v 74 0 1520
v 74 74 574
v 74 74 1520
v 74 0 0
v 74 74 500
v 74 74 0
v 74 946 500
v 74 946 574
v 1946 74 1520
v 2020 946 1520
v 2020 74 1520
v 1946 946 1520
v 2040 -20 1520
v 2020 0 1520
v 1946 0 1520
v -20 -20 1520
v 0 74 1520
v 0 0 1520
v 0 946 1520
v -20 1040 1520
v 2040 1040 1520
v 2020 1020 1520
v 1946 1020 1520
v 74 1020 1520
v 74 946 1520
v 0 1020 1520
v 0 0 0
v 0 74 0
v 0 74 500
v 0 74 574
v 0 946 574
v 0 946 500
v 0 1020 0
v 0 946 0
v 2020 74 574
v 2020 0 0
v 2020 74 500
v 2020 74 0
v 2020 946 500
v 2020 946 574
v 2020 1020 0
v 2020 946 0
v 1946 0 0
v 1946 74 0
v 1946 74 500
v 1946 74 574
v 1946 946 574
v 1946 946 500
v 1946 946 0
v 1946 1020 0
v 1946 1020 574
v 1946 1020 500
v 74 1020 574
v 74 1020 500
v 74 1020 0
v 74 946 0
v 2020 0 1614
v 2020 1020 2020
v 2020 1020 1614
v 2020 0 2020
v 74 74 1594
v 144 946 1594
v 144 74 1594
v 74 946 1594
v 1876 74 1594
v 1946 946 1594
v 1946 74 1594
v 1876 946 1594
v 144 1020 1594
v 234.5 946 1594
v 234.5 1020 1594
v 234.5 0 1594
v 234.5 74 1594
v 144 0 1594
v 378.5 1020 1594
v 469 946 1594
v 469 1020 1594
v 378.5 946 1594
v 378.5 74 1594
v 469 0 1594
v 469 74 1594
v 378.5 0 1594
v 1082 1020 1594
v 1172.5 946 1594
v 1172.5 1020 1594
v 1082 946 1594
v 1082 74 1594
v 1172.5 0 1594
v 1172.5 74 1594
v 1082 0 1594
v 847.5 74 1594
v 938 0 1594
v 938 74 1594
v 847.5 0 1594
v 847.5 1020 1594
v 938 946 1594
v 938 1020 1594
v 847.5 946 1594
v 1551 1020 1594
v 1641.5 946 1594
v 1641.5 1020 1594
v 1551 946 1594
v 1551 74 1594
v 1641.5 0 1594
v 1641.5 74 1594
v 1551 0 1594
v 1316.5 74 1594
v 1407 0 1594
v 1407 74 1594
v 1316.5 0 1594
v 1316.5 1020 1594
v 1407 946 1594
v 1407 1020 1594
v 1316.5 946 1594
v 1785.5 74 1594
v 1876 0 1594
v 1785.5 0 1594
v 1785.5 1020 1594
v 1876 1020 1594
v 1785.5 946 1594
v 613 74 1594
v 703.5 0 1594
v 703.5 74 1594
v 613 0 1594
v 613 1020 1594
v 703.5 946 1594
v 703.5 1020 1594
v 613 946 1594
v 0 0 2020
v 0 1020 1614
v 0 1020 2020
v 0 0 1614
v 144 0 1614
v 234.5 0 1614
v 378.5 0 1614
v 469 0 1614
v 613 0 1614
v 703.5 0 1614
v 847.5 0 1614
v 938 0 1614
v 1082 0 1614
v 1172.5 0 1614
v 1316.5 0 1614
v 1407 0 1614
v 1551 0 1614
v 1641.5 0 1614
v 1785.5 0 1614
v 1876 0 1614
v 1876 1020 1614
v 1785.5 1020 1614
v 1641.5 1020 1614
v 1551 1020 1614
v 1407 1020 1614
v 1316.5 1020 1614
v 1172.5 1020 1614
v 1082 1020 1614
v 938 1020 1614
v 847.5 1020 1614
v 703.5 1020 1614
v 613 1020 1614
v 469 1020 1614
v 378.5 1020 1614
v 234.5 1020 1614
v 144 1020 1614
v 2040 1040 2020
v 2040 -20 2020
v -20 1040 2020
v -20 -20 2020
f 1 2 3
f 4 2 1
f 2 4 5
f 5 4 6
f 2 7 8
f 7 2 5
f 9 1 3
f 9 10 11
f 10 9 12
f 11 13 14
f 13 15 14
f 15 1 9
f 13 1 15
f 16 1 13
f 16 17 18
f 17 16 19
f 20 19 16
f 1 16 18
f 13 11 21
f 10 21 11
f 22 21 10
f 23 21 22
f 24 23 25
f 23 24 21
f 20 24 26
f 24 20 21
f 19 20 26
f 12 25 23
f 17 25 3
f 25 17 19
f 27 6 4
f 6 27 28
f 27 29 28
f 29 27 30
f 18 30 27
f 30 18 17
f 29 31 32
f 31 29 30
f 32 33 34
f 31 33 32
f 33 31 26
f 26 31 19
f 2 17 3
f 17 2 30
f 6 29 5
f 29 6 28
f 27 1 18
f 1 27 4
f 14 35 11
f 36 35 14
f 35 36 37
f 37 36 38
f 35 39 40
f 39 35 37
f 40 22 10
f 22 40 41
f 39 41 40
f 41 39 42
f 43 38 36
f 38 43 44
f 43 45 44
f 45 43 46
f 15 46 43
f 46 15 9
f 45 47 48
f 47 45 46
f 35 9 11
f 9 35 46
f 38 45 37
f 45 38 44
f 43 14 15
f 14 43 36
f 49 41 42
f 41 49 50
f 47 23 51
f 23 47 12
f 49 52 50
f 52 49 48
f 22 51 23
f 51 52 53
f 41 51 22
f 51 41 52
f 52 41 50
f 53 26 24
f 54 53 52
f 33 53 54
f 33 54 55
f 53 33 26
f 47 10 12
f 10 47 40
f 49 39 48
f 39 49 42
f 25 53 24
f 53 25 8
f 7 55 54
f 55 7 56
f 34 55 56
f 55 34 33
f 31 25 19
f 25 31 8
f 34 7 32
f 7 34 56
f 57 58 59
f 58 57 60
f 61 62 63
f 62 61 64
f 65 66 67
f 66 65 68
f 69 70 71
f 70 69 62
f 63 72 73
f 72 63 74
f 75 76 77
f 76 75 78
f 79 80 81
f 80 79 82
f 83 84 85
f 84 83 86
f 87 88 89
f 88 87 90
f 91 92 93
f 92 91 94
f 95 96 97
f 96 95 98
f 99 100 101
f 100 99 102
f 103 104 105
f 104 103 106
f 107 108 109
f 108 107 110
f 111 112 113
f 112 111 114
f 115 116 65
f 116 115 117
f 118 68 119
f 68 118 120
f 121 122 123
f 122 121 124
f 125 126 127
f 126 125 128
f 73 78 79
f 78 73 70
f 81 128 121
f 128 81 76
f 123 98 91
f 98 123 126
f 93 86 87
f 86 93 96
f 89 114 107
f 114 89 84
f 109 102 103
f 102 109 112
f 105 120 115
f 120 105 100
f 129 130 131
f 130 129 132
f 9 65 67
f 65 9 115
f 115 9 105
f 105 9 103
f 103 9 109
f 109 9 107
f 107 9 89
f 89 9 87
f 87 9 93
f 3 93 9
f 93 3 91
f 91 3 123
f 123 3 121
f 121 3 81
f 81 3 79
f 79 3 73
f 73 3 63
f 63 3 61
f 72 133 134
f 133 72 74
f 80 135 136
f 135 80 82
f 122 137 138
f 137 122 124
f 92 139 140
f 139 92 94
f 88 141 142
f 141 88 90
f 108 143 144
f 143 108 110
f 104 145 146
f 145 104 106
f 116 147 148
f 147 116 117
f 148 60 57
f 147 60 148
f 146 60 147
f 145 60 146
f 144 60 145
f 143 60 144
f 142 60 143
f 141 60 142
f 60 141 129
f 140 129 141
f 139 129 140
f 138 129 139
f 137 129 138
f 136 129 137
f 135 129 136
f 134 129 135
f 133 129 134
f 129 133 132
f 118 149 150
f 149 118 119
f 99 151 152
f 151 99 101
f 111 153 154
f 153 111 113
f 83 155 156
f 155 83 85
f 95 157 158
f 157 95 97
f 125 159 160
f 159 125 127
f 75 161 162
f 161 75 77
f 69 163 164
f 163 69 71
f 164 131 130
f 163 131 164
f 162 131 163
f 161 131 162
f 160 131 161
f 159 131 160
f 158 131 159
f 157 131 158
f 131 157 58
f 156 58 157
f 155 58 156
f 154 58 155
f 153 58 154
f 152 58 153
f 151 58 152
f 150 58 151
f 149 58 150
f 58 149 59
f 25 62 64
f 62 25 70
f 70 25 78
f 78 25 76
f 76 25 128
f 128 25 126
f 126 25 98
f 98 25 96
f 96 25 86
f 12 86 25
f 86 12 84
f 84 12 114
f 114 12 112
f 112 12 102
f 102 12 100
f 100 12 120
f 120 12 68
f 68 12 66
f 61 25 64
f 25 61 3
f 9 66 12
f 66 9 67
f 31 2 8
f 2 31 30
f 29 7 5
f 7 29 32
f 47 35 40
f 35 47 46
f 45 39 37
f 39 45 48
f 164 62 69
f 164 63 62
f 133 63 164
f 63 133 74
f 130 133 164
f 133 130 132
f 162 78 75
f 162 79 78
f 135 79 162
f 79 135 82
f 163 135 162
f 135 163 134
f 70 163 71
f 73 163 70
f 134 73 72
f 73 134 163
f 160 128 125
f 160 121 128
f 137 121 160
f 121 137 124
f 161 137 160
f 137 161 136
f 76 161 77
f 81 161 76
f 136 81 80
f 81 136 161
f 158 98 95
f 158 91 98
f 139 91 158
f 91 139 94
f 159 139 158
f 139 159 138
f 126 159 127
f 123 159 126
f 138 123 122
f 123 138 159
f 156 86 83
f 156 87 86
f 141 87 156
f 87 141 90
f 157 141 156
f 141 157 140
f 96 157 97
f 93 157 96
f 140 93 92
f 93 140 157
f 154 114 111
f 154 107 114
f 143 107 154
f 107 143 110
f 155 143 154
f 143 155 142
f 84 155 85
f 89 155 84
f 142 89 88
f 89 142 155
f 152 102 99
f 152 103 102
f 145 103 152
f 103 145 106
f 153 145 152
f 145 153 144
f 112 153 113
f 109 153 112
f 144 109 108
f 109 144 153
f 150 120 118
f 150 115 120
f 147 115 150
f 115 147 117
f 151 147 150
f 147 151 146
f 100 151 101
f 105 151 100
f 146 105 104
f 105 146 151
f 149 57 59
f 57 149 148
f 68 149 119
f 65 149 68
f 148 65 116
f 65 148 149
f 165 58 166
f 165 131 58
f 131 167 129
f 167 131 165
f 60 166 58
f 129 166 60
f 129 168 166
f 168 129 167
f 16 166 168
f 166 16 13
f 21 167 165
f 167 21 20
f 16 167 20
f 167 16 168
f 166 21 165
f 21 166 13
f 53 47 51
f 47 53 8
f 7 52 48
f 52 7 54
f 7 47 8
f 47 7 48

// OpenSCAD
// bed module

bed_length              = 2020;
bed_width               = 1020;
bed_frame_height        = 30;

bed_leg_height          = 1520;
bed_leg_width           = 74;

bed_rim_height          = 500;
bed_rim_width           = 20;

bed_frame_bar_width     = 144;
bed_frame_bar_height    = 20;
bed_frame_bar_space     = 80;


// example render with above values
bed(bed_length,
    bed_width,
    bed_frame_height,
    bed_leg_height,
    bed_leg_width,
    bed_rim_height,
    bed_rim_width,
    bed_frame_bar_height,
    bed_frame_bar_width,
    bed_frame_bar_space
    );


module bed(length,
           width,
           frame_height,
           leg_height,
           leg_width,
           rim_height,
           rim_width,
           frame_bar_height,
           frame_bar_width,
           frame_bar_space){
               
    // calculate frame bar values
    frame_bar_length    = width;
    frame_bar_num       = floor((length - frame_bar_width)
                         /(frame_bar_width + frame_bar_space));
    
    frame_bar_space     = (((length - frame_bar_width)
                            %(frame_bar_width + frame_bar_space))
                           /frame_bar_num)
                          +frame_bar_space;
               
    // calculate leg values
    bed_leg_x   = bed_length - leg_width;
    bed_leg_y   = bed_width - leg_width;
    bed_leg_pos = [[0,0,0],
                   [bed_leg_x,0,0],
                   [bed_leg_x,bed_leg_y,0],
                   [0,bed_leg_y,0]];


    // legs
    color("red")
    for (i=bed_leg_pos){
        translate(i)
            cube([leg_width,leg_width,leg_height]);
    }

    
    // upper side cross bars
    for(i=[0,width-leg_width])
        translate([0,i,leg_height])
            cube([length,leg_width,leg_width]);

    // upper front/back crossbars
    for(i=[0,length-leg_width]){
        translate([i,leg_width,leg_height])
            cube([leg_width,width-2*leg_width,leg_width]);
    }
    
    // lower side crossbars
    translate([leg_width,width-leg_width,rim_height])
        cube([length-2*leg_width,leg_width,leg_width]);
    
    // lower front/back cross bars
    for(i=[0,length-leg_width]){
        translate([i,leg_width,rim_height])
            cube([leg_width,width-2*leg_width,leg_width]);
    }    



    // bed frame bars
    translate([0,0,leg_height+leg_width]) {
    
        // first frame bar
        cube([frame_bar_width, frame_bar_length, frame_bar_height]);
        
        
        // remaining frame bars
        for(i=[0:1:frame_bar_num]){
            translate([i*(frame_bar_width+frame_bar_space),0,0])
                cube([frame_bar_width, frame_bar_length, frame_bar_height]);
        }
    }
    
    /*color("blue")
    translate([0,0,bed_leg_height])
        cube([length,width,frame_height]);
    */ 
    // side rims
    #for(i=[-rim_width, width])
        translate([0,i,leg_height])
            cube([length,rim_width,rim_height]);
    
    // front/back rims
    #for(i=[-rim_width, length])
        translate([i,-rim_width,leg_height])
            cube([rim_width,width + 2*rim_width,rim_height]);
    
    // output materials
    echo("Legs:\t\t 4x: ", h=leg_width, w=leg_width, l=leg_height);
    echo("Upper crossbars side:\t 2x: ", h=leg_width, w=leg_width, l=length);
    echo("Lower crossbars side:\t 1x: ", h=leg_width, w=leg_width, l=length-2*leg_width);
    echo("Crossbars f/b:\t 4x: ", h=leg_width, w=leg_width, h=width-2*leg_width);
    echo();
    echo("Total length\t ", 4*leg_height
                          + 2*length
                          + length-2*leg_width
                          + 4*(width-2*leg_width));
    echo("Rims side\t 2x: ", h=rim_width, w=rim_height, l=length);
    echo("Rims front/back\t 2x: ", h=rim_width, w=rim_height, l=width + 2*rim_width);
    echo("Frame bars\t ", num=frame_bar_num + 1, h=frame_bar_height, w=frame_bar_width, l=frame_bar_length);
    echo("Frame bar space\t ",frame_bar_space);
}
